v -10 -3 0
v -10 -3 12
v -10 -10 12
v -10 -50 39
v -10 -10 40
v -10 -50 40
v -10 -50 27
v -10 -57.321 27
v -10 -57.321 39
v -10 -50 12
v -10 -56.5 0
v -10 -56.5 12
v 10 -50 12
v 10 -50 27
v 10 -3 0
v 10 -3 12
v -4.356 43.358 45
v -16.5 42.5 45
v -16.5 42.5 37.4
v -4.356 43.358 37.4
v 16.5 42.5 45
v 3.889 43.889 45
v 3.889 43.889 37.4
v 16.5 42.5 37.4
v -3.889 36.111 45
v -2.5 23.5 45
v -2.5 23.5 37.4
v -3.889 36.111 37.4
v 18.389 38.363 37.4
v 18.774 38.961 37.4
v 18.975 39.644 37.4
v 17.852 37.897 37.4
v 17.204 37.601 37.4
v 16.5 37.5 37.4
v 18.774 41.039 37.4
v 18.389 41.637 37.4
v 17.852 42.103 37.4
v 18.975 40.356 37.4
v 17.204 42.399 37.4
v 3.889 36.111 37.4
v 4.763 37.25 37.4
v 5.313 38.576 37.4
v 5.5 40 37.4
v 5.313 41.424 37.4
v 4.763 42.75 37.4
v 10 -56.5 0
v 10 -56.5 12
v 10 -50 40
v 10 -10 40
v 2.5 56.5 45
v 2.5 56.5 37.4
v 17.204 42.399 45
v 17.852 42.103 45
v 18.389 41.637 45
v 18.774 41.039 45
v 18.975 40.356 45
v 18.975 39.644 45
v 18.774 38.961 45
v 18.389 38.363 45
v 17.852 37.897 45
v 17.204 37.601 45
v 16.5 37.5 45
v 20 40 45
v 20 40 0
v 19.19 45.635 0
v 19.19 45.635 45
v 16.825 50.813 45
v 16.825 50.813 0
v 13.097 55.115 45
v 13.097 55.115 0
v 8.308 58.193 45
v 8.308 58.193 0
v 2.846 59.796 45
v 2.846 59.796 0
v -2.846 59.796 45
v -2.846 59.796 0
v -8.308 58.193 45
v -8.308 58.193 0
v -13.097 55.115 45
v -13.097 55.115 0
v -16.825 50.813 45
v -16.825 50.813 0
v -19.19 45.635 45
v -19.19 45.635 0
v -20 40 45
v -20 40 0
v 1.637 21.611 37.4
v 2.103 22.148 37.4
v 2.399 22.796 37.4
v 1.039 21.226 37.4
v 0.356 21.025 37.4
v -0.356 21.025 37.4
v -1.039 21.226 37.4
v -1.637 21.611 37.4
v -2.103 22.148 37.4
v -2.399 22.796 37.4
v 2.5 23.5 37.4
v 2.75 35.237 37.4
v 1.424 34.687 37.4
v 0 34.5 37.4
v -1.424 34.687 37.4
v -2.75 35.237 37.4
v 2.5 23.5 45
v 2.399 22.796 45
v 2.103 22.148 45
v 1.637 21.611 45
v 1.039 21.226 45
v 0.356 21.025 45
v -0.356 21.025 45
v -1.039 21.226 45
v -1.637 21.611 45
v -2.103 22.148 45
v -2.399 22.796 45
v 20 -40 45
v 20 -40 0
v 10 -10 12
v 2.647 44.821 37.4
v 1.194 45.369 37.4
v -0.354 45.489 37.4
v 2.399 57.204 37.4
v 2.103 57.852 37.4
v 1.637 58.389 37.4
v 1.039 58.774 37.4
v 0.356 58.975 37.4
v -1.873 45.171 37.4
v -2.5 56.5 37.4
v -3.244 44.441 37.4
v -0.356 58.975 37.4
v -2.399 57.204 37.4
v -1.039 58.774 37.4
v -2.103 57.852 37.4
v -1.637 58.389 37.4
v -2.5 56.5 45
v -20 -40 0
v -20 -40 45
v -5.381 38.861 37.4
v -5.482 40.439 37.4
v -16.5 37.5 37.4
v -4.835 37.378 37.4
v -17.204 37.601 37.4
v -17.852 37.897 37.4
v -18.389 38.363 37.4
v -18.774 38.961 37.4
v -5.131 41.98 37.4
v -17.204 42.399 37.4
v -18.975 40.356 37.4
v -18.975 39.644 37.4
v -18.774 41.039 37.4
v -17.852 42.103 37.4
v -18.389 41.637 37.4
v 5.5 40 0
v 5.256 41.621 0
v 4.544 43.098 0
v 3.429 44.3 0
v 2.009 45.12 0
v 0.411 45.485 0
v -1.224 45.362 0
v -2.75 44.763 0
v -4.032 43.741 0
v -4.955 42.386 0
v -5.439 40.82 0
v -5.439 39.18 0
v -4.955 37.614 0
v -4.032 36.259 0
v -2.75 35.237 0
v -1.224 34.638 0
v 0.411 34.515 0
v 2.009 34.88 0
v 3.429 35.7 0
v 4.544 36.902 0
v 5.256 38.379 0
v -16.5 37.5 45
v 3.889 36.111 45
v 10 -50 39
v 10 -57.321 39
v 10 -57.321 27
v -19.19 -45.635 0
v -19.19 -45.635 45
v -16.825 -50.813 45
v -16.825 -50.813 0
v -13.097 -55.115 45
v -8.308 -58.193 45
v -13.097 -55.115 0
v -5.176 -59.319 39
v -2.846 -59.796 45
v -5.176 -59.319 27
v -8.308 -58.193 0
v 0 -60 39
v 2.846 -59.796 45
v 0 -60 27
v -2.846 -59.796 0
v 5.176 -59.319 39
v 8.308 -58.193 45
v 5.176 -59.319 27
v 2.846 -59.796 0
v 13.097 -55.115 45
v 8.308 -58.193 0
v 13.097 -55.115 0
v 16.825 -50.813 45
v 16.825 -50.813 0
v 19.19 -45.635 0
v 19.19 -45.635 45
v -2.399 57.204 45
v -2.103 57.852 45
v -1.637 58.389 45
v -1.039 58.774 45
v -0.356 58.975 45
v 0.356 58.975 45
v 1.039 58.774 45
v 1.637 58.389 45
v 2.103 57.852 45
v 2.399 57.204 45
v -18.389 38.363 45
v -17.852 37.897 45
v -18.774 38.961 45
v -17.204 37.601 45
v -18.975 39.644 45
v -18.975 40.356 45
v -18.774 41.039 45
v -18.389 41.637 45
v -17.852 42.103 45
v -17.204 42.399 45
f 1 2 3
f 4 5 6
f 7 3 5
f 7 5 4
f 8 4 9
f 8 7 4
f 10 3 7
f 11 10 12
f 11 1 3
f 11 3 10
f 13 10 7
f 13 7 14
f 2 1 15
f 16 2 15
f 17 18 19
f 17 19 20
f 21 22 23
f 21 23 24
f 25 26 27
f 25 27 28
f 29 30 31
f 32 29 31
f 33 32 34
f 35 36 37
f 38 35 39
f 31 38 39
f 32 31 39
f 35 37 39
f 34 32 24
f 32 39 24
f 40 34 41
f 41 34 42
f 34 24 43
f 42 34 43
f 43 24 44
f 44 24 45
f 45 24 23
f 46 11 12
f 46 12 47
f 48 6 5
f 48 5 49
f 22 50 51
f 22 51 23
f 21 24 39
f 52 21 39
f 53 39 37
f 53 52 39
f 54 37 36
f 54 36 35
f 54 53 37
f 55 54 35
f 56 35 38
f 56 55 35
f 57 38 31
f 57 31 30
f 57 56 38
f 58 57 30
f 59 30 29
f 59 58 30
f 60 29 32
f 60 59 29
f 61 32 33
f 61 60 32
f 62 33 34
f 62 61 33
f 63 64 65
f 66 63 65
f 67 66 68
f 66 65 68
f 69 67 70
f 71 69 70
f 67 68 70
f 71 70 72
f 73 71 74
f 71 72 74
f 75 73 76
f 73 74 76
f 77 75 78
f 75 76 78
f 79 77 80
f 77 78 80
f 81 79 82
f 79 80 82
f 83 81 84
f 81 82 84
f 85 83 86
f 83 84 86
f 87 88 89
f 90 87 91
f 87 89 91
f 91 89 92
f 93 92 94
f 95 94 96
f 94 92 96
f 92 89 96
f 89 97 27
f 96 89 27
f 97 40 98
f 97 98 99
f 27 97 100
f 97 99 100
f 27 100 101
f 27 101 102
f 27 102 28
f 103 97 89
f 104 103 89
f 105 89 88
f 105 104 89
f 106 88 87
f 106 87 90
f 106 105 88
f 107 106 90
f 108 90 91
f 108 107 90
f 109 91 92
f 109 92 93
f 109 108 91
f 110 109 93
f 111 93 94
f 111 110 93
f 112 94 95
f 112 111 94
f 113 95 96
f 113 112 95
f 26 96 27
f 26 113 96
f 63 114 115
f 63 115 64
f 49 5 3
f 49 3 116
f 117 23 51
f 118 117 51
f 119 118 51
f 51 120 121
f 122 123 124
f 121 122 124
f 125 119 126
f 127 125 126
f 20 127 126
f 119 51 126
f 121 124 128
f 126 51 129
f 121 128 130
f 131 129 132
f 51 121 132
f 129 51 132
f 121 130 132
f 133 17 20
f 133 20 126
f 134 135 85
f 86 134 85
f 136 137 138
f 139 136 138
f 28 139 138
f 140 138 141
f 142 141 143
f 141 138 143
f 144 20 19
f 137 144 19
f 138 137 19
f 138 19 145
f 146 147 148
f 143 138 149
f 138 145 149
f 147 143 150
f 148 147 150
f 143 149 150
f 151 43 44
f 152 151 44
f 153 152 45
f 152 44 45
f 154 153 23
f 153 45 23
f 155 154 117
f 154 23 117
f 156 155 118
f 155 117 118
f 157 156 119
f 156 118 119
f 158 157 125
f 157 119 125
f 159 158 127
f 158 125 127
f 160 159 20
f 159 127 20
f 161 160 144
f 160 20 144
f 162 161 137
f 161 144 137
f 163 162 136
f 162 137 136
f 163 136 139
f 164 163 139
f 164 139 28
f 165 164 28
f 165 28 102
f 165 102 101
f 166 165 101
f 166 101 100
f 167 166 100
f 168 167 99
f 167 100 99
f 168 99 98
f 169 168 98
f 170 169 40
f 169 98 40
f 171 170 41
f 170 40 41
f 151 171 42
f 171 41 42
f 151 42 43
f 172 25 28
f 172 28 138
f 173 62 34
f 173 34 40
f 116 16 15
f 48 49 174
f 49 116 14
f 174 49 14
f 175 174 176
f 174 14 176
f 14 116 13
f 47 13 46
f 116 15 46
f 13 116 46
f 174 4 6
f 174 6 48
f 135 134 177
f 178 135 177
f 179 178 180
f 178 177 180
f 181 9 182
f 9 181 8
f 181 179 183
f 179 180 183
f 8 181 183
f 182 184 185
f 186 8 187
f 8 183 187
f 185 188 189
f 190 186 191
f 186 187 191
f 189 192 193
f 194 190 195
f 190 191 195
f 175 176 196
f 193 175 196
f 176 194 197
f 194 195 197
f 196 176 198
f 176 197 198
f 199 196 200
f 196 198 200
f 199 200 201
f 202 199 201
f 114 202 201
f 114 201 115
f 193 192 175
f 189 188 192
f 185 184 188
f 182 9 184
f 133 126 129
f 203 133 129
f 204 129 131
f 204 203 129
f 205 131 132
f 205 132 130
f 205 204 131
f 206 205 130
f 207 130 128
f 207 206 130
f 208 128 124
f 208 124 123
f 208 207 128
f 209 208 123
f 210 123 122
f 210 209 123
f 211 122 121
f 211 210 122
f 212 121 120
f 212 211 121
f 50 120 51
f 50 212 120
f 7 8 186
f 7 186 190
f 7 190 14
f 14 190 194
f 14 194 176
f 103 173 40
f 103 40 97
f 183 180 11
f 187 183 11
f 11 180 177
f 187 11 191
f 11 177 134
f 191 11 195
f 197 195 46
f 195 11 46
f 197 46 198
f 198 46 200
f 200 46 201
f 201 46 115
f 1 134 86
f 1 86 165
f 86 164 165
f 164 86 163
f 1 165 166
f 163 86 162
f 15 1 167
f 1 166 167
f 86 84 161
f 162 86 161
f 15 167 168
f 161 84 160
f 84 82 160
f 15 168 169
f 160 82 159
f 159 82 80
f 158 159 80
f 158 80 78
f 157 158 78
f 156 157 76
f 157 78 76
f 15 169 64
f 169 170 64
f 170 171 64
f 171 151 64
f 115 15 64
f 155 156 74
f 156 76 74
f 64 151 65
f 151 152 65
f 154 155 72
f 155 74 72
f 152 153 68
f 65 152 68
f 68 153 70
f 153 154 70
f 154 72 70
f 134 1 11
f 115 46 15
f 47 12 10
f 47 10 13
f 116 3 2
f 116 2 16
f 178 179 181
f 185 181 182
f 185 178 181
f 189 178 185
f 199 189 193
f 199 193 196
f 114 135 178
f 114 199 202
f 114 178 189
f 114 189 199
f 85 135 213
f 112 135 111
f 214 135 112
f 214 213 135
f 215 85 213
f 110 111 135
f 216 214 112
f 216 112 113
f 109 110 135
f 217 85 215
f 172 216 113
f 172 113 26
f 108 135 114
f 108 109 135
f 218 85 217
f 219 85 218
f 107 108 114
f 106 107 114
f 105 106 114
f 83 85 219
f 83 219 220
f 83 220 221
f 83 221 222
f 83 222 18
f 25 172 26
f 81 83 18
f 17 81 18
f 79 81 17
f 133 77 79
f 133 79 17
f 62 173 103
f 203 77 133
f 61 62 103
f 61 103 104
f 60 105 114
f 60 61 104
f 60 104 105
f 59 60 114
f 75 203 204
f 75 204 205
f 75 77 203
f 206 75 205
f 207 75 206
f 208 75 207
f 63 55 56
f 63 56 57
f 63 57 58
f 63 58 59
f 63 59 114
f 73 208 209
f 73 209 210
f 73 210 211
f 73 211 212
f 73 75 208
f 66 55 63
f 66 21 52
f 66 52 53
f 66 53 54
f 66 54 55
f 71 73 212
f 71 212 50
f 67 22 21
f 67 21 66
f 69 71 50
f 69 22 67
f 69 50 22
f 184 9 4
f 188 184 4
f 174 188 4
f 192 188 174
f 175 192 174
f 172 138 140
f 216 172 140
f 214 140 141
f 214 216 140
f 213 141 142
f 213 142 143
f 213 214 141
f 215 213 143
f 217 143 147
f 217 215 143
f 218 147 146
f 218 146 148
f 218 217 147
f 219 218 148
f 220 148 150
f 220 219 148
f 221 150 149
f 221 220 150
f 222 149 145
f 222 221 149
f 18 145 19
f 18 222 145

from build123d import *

# Parameters (mm, degrees)
CROQUIS1_R                = 20
SALIENTE_EXTRUIR1_DEPTH   = 45
SALIENTE_EXTRUIR1_2_DEPTH = 45
CROQUIS2_W                = 40
CROQUIS2_H                = 80
SALIENTE_EXTRUIR2_DEPTH   = 45
CORTAR_EXTRUIR2_DEPTH     = 7.6
CROQUIS4_R                = 5.5
CORTAR_EXTRUIR3_DEPTH     = 50
CROQUIS5_W                = 20
CROQUIS5_H                = 40
CORTAR_EXTRUIR4_DEPTH     = 40
CROQUIS6_W                = 20
CROQUIS6_H                = 6.5
CROQUIS6_H_2              = 7
CORTAR_EXTRUIR5_DEPTH     = 12
CORTAR_EXTRUIR6_START     = -27
CROQUIS7_W                = 20
CROQUIS7_H                = 13.910937509
CORTAR_EXTRUIR6_DEPTH     = 12


with BuildPart() as part:
    # Croquis1 → Saliente-Extruir1 (new body)
    with BuildSketch(Plane(origin=(0, 0, 0), x_dir=(0, 1, 0), z_dir=(0, 0, 1))):
        with Locations(Location((-40, 0, 0), (0, 0, 90))):
            Circle(CROQUIS1_R)
    extrude(amount=SALIENTE_EXTRUIR1_DEPTH)



with BuildPart() as body_2:
    # Croquis1 → Saliente-Extruir1 2 (new body)
    with BuildSketch(Plane(origin=(0, 0, 0), x_dir=(0, 1, 0), z_dir=(0, 0, 1))):
        with Locations(Location((40, 0, 0), (0, 0, 90))):
            Circle(CROQUIS1_R)
    extrude(amount=SALIENTE_EXTRUIR1_2_DEPTH)


with BuildPart() as part_1:
    add(part.part)

    add(body_2.part)  # Saliente-Extruir2 merges body 2
    # Croquis2 → Saliente-Extruir2 (add)
    with BuildSketch(Plane.XY.offset(45)):
        Rectangle(CROQUIS2_W, CROQUIS2_H)
    extrude(amount=-SALIENTE_EXTRUIR2_DEPTH)

    # Croquis3 → Cortar-Extruir2 (cut)
    with BuildSketch(Plane.XY.offset(45)):
        with BuildLine():
            Line((-16.5, 42.5), (-4.355962306, 43.357914886))
            Line((-4.355962306, 43.357914886), (-2.5, 56.5))
            ThreePointArc((-2.5, 56.5), (0, 59), (2.5, 56.5))
            Line((2.5, 56.5), (3.889087297, 43.889087297))
            Line((3.889087297, 43.889087297), (16.5, 42.5))
            ThreePointArc((16.5, 42.5), (19, 40), (16.5, 37.5))
            Line((16.5, 37.5), (3.889087297, 36.110912703))
            Line((3.889087297, 36.110912703), (2.5, 23.5))
            ThreePointArc((2.5, 23.5), (0, 21), (-2.5, 23.5))
            Line((-2.5, 23.5), (-3.889087297, 36.110912703))
            Line((-3.889087297, 36.110912703), (-16.5, 37.5))
            ThreePointArc((-16.5, 37.5), (-19, 40), (-16.5, 42.5))
        make_face()
    extrude(amount=-CORTAR_EXTRUIR2_DEPTH, mode=Mode.SUBTRACT)

    # Croquis4 → Cortar-Extruir3 (cut)
    with BuildSketch(Plane.XY.offset(45)):
        with Locations((0, 40)):
            Circle(CROQUIS4_R)
    extrude(amount=-CORTAR_EXTRUIR3_DEPTH, mode=Mode.SUBTRACT)

    # Croquis5 → Cortar-Extruir4 (cut)
    with BuildSketch(Plane(origin=(0, 0, 0), x_dir=(1, 0, 0), z_dir=(0, 0, -1))):
        with Locations((0, 30)):
            Rectangle(CROQUIS5_W, CROQUIS5_H)
    extrude(amount=-CORTAR_EXTRUIR4_DEPTH, mode=Mode.SUBTRACT)

    # Croquis6 → Cortar-Extruir5 (cut)
    with BuildSketch(Plane(origin=(0, 0, 0), x_dir=(1, 0, 0), z_dir=(0, 0, -1))):
        with Locations((0, 53.25)):
            Rectangle(CROQUIS6_W, CROQUIS6_H)
        with Locations((0, 6.5)):
            Rectangle(CROQUIS6_W, CROQUIS6_H_2)
    extrude(amount=-CORTAR_EXTRUIR5_DEPTH, mode=Mode.SUBTRACT)

    # Croquis7 → Cortar-Extruir6 (cut)
    with BuildSketch(Plane(origin=(0, 0, 0), x_dir=(1, 0, 0), z_dir=(0, 0, -1)).offset(CORTAR_EXTRUIR6_START)):
        with Locations((0, 56.955468755)):
            Rectangle(CROQUIS7_W, CROQUIS7_H)
    extrude(amount=-CORTAR_EXTRUIR6_DEPTH, mode=Mode.SUBTRACT)


solid = part_1.part
